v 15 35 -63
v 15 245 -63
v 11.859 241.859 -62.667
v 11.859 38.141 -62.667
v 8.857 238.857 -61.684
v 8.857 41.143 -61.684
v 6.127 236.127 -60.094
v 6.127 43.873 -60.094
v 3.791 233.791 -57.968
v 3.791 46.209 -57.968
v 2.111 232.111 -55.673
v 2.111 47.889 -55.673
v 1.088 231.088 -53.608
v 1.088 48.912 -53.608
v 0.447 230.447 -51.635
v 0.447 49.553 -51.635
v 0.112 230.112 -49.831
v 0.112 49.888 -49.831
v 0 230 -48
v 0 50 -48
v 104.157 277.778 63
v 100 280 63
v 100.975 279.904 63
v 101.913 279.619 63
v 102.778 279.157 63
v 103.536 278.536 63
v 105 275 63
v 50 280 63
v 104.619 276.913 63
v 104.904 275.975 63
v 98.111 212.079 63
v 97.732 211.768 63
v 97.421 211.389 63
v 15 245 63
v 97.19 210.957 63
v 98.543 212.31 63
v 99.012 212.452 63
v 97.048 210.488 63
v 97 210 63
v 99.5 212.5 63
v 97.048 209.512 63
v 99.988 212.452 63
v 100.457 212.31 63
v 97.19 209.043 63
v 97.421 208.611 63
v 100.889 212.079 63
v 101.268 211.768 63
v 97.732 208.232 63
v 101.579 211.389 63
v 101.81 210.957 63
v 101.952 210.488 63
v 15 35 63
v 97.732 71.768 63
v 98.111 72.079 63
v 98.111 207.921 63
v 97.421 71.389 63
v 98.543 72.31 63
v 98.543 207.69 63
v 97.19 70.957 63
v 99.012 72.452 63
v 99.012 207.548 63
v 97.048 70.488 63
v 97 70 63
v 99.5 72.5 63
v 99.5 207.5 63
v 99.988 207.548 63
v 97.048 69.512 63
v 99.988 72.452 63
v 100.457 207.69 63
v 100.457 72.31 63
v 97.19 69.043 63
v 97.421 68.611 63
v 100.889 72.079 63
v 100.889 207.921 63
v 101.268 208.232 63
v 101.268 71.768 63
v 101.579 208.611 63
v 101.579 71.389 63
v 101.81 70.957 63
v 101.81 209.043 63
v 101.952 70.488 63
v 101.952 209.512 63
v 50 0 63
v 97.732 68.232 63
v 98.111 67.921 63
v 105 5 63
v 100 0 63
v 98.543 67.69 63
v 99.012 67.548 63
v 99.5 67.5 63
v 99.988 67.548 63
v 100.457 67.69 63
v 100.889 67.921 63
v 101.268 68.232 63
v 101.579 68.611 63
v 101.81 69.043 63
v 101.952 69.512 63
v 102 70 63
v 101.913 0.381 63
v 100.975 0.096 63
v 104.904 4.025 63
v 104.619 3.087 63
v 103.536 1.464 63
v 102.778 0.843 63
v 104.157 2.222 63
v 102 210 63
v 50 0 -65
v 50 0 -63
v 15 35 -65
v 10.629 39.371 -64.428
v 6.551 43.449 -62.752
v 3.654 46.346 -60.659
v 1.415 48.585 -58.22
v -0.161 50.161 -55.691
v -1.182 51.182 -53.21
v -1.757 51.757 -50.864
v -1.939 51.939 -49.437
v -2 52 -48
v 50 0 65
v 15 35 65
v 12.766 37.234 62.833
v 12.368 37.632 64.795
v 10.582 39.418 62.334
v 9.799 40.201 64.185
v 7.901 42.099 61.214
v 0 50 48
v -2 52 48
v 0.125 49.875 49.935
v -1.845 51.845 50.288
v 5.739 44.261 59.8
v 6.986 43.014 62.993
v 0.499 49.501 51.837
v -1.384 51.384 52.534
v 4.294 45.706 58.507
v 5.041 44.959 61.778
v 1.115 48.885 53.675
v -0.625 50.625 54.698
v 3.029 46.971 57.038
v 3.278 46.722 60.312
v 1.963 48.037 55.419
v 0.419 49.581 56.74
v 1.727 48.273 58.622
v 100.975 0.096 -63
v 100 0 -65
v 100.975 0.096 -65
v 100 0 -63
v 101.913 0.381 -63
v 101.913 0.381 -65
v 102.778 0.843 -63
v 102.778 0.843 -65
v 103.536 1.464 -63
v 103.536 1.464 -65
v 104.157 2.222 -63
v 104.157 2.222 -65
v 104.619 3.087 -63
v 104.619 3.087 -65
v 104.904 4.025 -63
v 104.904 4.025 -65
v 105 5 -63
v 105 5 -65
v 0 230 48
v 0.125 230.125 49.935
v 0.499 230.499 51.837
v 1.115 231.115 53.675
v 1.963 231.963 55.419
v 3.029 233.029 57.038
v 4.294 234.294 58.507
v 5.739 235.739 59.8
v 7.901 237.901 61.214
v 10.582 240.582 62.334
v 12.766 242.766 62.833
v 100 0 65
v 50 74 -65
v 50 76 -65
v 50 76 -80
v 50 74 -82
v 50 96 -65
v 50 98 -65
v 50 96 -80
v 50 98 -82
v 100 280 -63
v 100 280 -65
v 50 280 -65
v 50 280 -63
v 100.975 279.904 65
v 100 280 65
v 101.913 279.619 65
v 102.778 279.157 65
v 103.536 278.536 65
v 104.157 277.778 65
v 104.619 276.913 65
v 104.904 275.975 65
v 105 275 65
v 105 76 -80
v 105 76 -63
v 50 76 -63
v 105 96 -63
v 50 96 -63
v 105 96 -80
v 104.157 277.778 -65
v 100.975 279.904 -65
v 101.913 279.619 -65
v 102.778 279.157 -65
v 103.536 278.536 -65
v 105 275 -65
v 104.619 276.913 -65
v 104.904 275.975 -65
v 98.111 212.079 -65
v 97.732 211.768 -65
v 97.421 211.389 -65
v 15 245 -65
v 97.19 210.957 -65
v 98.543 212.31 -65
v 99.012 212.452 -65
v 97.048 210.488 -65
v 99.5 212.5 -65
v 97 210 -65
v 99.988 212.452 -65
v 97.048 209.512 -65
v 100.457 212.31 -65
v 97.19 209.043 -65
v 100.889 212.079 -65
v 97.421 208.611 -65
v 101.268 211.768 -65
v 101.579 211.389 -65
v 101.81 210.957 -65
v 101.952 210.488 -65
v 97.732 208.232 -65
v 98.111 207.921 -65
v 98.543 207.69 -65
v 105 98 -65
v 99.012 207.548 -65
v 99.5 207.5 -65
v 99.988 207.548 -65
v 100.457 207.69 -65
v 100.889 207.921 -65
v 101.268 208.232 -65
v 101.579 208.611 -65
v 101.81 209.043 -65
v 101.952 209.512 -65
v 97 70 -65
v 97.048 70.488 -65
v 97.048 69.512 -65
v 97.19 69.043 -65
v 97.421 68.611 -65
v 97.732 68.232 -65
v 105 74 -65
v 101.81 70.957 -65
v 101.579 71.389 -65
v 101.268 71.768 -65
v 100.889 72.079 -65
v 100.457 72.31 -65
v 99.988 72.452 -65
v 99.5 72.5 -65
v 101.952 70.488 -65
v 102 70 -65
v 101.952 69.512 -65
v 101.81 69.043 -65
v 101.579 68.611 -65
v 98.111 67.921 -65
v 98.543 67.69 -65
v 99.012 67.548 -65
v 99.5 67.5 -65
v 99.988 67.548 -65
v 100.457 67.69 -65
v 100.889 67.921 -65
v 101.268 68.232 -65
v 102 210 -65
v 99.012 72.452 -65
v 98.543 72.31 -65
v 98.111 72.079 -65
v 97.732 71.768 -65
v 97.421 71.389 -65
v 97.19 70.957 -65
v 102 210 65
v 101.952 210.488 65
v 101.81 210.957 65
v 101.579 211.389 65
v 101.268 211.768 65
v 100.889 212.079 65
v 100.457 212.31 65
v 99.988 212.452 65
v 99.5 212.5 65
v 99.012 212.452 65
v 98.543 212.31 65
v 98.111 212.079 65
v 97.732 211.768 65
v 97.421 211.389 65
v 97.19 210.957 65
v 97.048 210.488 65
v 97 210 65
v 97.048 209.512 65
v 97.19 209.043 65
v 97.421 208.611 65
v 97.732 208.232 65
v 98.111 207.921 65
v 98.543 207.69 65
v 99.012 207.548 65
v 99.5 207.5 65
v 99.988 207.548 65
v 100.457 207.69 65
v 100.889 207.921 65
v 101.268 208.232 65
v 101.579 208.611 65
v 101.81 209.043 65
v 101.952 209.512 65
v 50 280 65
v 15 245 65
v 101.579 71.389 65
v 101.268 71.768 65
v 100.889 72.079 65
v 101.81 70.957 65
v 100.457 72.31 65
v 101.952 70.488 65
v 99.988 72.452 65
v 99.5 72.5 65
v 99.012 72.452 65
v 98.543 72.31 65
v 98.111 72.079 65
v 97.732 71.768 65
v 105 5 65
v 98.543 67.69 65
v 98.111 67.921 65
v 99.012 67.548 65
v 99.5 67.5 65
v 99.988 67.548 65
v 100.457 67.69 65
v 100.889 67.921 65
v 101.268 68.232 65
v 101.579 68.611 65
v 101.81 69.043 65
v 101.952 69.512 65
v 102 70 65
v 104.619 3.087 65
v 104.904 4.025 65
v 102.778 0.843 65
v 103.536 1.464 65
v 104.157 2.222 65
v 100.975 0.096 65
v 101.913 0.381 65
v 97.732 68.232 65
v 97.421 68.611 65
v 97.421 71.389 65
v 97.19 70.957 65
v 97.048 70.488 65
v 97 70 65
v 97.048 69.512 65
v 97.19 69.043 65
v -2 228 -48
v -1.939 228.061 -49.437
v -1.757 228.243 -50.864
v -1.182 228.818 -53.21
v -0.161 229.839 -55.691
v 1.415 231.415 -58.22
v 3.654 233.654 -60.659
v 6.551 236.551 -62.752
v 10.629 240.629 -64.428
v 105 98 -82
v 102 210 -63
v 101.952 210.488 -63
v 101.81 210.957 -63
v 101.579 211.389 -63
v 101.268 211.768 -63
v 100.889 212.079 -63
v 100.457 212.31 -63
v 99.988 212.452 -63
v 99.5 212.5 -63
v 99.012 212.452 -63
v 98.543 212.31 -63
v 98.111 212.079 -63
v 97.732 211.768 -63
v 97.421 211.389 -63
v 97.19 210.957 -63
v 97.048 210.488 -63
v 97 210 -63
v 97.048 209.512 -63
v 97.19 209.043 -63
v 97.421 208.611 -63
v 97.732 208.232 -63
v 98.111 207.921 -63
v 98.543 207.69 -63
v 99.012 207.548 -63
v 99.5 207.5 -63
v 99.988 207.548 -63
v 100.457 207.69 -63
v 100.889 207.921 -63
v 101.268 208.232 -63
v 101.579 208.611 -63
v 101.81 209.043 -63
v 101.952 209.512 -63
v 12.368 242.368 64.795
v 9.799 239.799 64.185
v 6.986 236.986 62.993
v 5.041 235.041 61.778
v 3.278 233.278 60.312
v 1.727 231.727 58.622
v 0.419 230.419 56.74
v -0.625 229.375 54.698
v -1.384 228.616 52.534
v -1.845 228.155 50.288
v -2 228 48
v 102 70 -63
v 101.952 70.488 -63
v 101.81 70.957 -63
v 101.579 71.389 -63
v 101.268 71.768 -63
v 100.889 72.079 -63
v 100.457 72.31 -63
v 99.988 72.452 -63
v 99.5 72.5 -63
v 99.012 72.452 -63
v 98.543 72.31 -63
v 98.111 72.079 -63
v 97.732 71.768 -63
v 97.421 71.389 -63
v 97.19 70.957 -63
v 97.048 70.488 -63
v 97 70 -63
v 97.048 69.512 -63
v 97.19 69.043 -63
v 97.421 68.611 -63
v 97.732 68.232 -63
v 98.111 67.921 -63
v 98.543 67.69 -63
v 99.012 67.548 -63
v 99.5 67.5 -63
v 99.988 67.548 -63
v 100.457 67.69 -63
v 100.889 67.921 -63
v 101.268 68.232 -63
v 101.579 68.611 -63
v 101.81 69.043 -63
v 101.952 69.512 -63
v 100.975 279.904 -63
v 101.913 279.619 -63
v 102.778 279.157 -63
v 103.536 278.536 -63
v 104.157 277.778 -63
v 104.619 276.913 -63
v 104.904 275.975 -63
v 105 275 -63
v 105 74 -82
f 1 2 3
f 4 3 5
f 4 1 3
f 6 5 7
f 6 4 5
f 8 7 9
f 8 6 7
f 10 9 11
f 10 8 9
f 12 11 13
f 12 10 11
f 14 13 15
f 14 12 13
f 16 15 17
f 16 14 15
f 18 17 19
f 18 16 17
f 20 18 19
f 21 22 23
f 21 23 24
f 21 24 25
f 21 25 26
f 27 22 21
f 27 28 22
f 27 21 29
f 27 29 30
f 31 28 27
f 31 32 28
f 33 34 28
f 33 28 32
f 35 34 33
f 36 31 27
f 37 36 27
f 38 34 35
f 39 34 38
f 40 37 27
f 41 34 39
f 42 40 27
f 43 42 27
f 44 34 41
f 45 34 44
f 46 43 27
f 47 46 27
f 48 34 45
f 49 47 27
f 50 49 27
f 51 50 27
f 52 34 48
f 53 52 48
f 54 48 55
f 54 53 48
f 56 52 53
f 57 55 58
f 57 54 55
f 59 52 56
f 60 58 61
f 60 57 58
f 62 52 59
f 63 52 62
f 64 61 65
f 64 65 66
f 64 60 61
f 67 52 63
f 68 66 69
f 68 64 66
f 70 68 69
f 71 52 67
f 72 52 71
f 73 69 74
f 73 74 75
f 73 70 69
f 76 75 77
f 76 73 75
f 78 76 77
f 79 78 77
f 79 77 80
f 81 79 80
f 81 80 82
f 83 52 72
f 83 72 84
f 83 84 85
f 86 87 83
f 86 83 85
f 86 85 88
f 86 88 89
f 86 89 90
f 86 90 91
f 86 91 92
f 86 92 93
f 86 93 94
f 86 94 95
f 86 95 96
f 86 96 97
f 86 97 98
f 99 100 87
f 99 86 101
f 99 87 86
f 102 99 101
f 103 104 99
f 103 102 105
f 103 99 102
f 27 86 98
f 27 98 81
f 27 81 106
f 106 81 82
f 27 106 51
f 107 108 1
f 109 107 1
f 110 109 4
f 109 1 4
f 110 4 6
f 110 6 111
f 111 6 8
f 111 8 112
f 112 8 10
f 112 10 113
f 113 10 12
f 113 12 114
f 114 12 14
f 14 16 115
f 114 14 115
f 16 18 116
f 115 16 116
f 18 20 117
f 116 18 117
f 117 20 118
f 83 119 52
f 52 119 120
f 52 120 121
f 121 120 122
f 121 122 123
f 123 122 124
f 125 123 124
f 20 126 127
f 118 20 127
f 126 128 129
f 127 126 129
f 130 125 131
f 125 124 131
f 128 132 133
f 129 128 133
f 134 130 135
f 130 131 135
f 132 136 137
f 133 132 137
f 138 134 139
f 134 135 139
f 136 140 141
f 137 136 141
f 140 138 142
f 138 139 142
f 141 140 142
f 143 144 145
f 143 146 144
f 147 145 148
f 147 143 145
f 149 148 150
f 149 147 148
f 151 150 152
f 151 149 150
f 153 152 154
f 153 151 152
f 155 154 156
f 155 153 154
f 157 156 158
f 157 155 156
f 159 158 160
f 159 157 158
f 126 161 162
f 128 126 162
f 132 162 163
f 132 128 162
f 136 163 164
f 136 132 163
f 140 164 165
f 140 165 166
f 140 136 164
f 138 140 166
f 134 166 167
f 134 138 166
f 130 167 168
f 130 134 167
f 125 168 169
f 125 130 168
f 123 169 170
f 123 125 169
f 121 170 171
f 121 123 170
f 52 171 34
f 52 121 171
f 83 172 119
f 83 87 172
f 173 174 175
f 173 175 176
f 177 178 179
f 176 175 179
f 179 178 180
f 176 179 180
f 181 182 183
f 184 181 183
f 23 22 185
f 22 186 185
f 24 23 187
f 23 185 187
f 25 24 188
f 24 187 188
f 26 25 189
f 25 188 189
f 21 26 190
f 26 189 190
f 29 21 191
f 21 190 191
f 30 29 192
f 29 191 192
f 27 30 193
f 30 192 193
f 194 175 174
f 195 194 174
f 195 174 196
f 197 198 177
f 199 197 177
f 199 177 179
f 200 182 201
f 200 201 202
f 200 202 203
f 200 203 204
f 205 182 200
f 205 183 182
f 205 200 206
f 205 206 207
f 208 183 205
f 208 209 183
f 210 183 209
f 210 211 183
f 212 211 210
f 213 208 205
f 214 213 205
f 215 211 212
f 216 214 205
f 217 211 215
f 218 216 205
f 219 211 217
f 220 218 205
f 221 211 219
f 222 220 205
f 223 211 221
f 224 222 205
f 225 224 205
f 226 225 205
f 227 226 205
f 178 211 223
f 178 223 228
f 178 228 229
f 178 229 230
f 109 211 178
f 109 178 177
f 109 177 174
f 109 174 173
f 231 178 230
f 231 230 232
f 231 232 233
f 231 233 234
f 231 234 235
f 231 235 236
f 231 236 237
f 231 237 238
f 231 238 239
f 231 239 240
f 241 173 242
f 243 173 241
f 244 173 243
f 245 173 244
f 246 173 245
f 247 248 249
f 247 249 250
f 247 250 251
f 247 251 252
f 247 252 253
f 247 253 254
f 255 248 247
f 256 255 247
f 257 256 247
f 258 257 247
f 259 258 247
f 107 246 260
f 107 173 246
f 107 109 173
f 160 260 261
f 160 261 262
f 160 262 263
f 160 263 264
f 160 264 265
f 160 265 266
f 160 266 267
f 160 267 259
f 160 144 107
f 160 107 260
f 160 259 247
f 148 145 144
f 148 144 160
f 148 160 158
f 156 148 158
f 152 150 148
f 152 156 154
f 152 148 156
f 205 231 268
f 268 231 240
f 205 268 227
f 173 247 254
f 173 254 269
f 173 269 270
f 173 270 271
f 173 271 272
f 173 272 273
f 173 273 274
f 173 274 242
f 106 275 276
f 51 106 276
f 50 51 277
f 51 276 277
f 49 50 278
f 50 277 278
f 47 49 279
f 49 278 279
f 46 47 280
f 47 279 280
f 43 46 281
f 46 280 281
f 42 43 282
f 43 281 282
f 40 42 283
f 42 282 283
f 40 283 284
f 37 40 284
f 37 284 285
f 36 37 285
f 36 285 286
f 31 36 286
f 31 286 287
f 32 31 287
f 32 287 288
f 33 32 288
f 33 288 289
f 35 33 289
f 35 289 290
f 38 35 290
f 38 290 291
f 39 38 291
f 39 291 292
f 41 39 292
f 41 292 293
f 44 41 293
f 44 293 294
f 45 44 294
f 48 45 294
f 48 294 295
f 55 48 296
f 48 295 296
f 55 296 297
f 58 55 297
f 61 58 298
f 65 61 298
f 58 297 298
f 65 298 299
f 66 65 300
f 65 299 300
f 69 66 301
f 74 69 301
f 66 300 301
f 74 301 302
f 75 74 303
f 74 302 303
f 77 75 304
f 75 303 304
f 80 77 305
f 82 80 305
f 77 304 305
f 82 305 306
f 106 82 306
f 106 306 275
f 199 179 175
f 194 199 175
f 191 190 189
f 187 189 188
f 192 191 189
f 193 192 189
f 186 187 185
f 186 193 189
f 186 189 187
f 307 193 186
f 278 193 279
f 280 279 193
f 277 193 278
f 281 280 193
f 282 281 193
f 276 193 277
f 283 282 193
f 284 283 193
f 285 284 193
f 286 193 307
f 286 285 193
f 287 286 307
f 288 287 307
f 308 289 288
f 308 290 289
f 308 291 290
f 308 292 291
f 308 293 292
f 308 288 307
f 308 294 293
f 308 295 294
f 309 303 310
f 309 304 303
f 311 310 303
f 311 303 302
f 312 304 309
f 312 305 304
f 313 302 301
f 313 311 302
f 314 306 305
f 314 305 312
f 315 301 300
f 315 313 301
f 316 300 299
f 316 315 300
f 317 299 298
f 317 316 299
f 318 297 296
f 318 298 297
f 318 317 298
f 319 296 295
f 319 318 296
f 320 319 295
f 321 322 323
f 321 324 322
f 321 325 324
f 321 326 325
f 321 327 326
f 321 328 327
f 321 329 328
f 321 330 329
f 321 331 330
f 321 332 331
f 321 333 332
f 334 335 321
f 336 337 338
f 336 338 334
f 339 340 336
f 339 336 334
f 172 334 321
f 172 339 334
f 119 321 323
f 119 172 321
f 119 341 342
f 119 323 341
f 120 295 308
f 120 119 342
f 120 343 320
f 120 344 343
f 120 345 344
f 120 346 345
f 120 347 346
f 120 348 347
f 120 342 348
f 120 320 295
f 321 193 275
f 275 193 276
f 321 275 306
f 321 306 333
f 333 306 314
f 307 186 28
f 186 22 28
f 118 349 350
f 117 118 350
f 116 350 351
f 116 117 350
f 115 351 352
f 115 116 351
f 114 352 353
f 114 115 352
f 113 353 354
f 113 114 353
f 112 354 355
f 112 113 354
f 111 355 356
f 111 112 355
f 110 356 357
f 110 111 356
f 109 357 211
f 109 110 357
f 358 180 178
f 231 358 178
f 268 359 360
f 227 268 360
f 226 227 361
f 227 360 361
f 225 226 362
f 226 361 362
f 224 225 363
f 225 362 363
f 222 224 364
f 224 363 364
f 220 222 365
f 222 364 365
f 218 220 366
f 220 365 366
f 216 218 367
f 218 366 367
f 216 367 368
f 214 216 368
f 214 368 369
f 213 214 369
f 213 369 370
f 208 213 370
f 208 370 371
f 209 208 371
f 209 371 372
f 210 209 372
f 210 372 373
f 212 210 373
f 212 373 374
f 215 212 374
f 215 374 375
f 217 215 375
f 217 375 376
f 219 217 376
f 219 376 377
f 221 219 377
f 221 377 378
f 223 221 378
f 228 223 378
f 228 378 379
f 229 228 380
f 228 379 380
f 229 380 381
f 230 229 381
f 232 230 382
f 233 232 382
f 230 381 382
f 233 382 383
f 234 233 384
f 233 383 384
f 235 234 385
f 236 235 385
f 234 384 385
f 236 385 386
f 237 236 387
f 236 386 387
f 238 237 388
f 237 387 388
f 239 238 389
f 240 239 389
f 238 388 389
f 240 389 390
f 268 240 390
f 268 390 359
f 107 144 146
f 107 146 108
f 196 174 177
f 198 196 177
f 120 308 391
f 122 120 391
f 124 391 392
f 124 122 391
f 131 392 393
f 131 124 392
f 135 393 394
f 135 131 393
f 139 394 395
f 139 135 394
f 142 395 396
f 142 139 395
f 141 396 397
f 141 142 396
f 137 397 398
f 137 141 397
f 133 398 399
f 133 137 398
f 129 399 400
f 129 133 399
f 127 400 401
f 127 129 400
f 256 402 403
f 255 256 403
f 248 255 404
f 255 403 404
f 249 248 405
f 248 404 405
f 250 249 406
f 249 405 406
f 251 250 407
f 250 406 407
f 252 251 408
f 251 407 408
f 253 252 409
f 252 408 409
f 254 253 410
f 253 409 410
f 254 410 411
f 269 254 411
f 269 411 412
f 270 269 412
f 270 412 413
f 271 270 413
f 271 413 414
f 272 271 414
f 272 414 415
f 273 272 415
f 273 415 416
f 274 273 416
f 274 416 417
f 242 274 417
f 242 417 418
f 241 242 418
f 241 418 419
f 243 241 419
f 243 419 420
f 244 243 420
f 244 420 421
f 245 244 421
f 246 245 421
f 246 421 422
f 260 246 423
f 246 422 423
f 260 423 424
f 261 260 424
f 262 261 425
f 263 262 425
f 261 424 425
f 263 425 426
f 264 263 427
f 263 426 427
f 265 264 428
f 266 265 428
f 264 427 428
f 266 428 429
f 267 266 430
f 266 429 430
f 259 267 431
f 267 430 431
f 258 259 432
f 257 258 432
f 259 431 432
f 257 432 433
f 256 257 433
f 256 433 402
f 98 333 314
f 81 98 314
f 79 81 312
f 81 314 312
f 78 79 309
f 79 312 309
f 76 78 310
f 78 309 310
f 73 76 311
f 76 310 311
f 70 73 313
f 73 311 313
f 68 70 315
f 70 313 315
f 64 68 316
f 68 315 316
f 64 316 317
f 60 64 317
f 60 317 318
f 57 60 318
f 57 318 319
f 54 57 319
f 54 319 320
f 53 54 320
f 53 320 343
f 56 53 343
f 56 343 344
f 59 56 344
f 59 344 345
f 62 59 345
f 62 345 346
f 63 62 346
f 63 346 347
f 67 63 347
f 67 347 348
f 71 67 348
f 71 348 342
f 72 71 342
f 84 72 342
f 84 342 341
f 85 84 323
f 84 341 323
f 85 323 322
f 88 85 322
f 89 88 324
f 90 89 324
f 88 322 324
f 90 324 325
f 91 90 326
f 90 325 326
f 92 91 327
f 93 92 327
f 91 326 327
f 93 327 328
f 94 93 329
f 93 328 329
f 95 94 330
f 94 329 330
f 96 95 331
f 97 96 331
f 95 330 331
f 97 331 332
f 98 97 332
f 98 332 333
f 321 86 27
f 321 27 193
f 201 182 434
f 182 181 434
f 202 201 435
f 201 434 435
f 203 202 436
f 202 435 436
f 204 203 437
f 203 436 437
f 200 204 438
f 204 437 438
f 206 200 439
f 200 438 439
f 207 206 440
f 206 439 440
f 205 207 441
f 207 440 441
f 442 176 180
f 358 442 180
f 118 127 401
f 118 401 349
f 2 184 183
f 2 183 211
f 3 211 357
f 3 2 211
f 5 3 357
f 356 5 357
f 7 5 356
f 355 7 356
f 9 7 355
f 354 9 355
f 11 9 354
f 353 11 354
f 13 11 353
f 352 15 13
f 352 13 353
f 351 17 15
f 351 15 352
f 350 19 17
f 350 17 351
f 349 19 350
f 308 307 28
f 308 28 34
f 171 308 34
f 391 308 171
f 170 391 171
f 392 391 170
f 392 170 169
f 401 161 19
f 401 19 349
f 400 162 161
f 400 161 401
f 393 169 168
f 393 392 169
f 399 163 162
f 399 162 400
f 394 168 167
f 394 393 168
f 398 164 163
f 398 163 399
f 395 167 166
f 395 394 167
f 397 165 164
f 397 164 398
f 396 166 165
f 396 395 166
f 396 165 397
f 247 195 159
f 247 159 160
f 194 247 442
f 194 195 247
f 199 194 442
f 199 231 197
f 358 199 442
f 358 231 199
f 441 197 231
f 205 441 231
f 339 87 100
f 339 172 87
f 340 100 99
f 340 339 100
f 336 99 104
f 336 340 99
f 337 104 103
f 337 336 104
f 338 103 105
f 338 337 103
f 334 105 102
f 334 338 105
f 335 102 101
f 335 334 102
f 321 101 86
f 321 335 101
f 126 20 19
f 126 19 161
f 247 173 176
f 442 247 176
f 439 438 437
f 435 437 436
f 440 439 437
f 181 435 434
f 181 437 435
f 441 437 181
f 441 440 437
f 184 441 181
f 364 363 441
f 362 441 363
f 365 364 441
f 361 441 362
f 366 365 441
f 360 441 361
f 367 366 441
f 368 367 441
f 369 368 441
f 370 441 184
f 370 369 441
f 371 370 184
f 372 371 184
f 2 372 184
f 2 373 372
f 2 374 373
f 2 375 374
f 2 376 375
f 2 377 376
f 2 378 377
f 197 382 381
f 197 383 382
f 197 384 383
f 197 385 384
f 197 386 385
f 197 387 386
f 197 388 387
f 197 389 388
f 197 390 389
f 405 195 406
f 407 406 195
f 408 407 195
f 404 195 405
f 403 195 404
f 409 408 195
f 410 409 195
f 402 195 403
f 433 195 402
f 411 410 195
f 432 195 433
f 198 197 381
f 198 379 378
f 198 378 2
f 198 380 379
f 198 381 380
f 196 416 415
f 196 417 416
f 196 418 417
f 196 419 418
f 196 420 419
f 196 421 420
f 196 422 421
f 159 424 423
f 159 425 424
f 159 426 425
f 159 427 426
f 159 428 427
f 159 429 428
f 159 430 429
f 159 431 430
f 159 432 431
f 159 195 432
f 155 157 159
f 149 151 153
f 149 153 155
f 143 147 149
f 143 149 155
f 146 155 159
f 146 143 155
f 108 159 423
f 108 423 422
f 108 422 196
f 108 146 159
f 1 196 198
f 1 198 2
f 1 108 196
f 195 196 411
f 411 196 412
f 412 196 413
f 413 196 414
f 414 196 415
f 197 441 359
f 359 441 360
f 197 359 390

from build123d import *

# Parameters (mm, degrees)
SM_BASE_FLANGE_1_DEPTH = 280
SKETCH_3_R             = 2.5
CUT_EXTRUDE_2_DEPTH    = 327.075144714
CUT_EXTRUDE_3_DEPTH    = 327.075144714
FILLET_1_R             = 5
SKETCH_5_W             = 55
SKETCH_5_H             = 20
CUT_EXTRUDE_4_DEPTH    = 2
EXTRUDE_1_DEPTH        = 55


# Sheet-metal steps are written as plain solids
with BuildPart() as part:
    # Sketch 1 → 基体-法兰1 (new body)
    with BuildSketch(Plane(origin=(0, 0, 0), x_dir=(1, 0, 0), z_dir=(0, 1, 0))):
        with BuildLine():
            Line((105, 63), (15, 63))
            ThreePointArc((15, 63), (4.393398282, 58.606601718), (0, 48))
            Line((0, 48), (0, -48))
            ThreePointArc((0, -48), (4.393398282, -58.606601718), (15, -63))
            Line((15, -63), (105, -63))
            Line((105, -63), (105, -65))
            Line((105, -65), (15, -65))
            ThreePointArc((15, -65), (2.97918472, -60.02081528), (-2, -48))
            Line((-2, -48), (-2, 48))
            ThreePointArc((-2, 48), (2.97918472, 60.02081528), (15, 65))
            Line((15, 65), (105, 65))
            Line((105, 65), (105, 63))
        make_face()
    extrude(amount=SM_BASE_FLANGE_1_DEPTH)

    # 草图3 → 切除-拉伸2 (cut, through all)
    with BuildSketch(Plane.XY.offset(65)):
        with Locations((99.5, 210)):
            Circle(SKETCH_3_R)
        with Locations((99.5, 70)):
            Circle(SKETCH_3_R)
    extrude(amount=-CUT_EXTRUDE_2_DEPTH, mode=Mode.SUBTRACT)

    # 草图4 → 切除-拉伸3 (cut, through all)
    with BuildSketch(Plane.XY.offset(65)):
        Polygon((50, 280), (-2, 228), (-2, 280), align=None)
        Polygon((-2, 52), (-2, 0), (50, 0), align=None)
    extrude(amount=-CUT_EXTRUDE_3_DEPTH, mode=Mode.SUBTRACT)

    # 圆角1
    fillet_1_edges = [part.edges().sort_by_distance(p)[0] for p in [
        (105, 0, 64),
        (105, 0, -64),
        (105, 280, 64),
        (105, 280, -64),
    ]]
    fillet(fillet_1_edges, radius=FILLET_1_R)

    # 草图5 → 切除-拉伸4 (cut)
    with BuildSketch(Plane(origin=(0, 0, -65), x_dir=(-1, 0, 0), z_dir=(0, 0, -1))):
        with Locations((-77.5, 86)):
            Rectangle(SKETCH_5_W, SKETCH_5_H)
    extrude(amount=-CUT_EXTRUDE_4_DEPTH, mode=Mode.SUBTRACT)

    # 草图6 → 凸台-拉伸1 (add)
    with BuildSketch(Plane(origin=(50, 0, 0), x_dir=(0, 0, -1), z_dir=(1, 0, 0))):
        Polygon((65, 96), (80, 96), (80, 76), (65, 76), (65, 74), (82, 74), (82, 98), (65, 98), align=None)
    extrude(amount=EXTRUDE_1_DEPTH)


solid = part.part
